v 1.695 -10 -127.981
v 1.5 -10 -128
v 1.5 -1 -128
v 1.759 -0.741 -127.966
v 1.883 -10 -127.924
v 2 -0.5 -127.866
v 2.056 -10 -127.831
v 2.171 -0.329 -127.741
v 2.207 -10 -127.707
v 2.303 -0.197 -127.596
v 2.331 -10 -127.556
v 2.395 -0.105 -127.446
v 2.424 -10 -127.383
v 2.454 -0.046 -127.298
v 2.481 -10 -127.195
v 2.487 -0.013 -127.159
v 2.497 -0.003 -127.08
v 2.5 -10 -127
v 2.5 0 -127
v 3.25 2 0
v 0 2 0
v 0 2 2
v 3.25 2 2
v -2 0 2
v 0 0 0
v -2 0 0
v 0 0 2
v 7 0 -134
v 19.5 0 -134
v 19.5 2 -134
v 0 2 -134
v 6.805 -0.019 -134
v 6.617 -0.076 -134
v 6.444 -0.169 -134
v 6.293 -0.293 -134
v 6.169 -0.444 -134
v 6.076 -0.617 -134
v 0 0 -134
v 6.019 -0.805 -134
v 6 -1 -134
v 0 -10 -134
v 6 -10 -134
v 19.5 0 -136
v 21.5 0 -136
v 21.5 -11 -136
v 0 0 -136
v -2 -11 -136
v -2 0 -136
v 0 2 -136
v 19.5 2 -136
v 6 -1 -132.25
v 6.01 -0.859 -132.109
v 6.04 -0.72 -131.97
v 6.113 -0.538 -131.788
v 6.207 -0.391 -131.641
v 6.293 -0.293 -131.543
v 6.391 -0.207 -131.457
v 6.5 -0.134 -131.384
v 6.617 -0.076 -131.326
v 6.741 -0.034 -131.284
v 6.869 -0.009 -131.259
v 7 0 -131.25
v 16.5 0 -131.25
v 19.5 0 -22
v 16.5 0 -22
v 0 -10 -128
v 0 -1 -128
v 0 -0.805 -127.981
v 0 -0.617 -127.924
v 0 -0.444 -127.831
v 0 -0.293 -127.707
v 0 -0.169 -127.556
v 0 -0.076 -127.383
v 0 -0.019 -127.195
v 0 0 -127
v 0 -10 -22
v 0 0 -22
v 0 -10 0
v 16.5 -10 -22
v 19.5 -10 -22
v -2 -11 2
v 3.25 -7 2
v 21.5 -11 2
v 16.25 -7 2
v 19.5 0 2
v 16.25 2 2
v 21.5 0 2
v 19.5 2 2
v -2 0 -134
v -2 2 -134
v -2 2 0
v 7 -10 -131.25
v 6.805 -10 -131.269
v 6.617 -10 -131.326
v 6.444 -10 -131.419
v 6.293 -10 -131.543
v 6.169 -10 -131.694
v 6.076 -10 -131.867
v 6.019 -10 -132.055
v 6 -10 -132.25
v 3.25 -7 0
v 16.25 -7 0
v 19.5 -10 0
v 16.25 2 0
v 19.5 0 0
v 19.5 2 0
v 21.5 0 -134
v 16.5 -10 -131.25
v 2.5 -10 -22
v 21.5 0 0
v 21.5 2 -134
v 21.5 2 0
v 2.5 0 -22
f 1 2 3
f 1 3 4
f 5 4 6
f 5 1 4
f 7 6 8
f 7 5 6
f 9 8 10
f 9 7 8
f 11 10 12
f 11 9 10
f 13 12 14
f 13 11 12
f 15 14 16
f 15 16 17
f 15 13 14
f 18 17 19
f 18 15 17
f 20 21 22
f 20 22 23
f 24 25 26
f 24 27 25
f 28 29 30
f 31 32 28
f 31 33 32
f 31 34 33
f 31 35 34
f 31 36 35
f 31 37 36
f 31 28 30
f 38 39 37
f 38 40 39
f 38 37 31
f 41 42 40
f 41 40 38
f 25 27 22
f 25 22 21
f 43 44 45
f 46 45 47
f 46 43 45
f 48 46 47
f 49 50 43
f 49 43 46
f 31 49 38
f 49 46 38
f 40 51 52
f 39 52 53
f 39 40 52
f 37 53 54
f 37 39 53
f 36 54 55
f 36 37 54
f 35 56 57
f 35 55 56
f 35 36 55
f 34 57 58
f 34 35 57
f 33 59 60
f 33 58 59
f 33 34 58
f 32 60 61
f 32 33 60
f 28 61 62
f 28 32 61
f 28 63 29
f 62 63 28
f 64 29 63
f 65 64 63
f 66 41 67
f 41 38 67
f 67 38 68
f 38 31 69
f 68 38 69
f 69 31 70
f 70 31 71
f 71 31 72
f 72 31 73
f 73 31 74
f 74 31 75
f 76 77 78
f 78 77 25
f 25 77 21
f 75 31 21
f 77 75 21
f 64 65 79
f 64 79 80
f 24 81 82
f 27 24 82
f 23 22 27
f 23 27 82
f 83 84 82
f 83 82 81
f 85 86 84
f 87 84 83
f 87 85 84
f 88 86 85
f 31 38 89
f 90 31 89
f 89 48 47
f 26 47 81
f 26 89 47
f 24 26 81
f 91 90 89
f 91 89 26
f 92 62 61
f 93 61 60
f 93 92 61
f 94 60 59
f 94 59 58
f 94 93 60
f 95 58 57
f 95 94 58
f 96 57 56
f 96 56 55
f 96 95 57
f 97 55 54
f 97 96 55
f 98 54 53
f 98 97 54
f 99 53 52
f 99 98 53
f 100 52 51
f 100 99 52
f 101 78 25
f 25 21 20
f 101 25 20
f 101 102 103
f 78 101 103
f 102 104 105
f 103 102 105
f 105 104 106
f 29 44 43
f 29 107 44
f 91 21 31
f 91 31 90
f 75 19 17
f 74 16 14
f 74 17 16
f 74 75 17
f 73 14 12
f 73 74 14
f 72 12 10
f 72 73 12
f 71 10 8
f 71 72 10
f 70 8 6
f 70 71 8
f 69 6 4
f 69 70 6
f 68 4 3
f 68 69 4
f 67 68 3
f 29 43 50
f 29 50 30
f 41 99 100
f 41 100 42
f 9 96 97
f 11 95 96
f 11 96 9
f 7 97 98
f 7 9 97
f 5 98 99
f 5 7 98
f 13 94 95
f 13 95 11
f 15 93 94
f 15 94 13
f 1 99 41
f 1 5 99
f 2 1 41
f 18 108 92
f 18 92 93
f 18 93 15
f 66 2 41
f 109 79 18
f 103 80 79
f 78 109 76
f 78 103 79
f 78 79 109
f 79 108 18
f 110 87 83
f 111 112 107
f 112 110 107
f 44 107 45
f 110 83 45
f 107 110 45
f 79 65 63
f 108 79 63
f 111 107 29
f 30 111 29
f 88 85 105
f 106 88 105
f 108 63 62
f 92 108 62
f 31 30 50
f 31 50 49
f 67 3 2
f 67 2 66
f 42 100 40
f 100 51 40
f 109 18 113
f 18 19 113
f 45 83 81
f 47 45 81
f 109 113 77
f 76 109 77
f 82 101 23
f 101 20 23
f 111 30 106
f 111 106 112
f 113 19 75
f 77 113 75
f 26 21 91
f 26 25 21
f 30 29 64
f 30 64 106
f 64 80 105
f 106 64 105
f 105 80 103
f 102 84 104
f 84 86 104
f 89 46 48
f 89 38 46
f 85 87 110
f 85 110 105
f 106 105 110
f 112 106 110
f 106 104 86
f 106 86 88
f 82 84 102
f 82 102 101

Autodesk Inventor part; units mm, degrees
ref_plane "YZ Plane" through (0, 0, 0) normal (1, 0, 0) x (0, 1, 0)
ref_plane "XZ Plane" through (0, 0, 0) normal (0, 1, 0) x (-1, 0, 0)
ref_plane "XY Plane" through (0, 0, 0) normal (0, 0, 1) x (1, 0, 0)
sketch "Sketch1" plane through (0, 0, 0) normal (0, 1, 0) x (-1, 0, 0)
  line L0 (0, 0) -> (-19.5, 0)
  line L1 (-19.5, 0) -> (-19.5, -134)
  line L2 (-19.5, -134) -> (0, -134)
  line L3 (0, -134) -> (0, 0)
  line L4 (2, 2) -> (-21.5, 2)
  line L5 (-21.5, 2) -> (-21.5, -136)
  line L6 (-21.5, -136) -> (2, -136)
  line L7 (2, -136) -> (2, 2)
  line L8 (-2.5, -22) -> (-16.5, -22)
  line L9 (-16.5, -22) -> (-16.5, -131.25)
  line L10 (-16.5, -131.25) -> (-2.5, -131.25)
  line L11 (-2.5, -131.25) -> (-2.5, -22)
  line L12 (-2.5, -22) -> (0, -22)
  line L13 (-2.5, -22) -> (0, -22) construction
  line L14 (-16.5, -22) -> (-19.5, -22)
  line L15 (-16.5, -22) -> (-13.5, -22) construction
  line L16 (-6.724, -131.25) -> (-3.974, -131.25) construction
  line L17 (-6, -131.25) -> (-6, -134)
  line L18 (-2.5, -128) -> (0, -128)
  line L19 (-3.25, 2) -> (-16.25, 2)
  line L20 (-16.25, 2) -> (-16.25, 0)
  line L21 (-16.25, 0) -> (-3.25, 0)
  line L22 (-3.25, 0) -> (-3.25, 2)
  line L23 (-19.5, 0) -> (-21.5, 0)
  line L24 (-21.5, 0) -> (-21.5, 2)
  line L25 (-21.5, 2) -> (-19.5, 2)
  line L26 (-19.5, 2) -> (-19.5, 0)
  line L27 (0, 0) -> (2, 0)
  line L28 (2, 0) -> (2, 2)
  line L29 (2, 2) -> (0, 2)
  line L30 (0, 2) -> (0, 0)
  line L31 (0, -134) -> (2, -134)
  line L32 (2, -134) -> (2, -136)
  line L33 (2, -136) -> (0, -136)
  line L34 (0, -136) -> (0, -134)
  line L35 (-19.5, -134) -> (-21.5, -134)
  line L36 (-21.5, -134) -> (-21.5, -136)
  line L37 (-21.5, -136) -> (-19.5, -136)
  line L38 (-19.5, -136) -> (-19.5, -134)
  dimension "d0" = 19.5
  dimension "d1" = 134
  dimension "d2" = 2
  dimension "d3" = 2
  dimension "d4" = 2
  dimension "d5" = 2
  dimension "d6" = 14
  dimension "d7" = 109.25
  dimension "d8" = 22
  dimension "d9" = 2.5
  dimension "d10" = 0
  dimension "d11" = 180
  dimension "d17" = 6
  dimension "d18" = 6
  dimension "d20" = 13
  dimension "d21" = 5.25
extrude "Extrusion1" add sketch "Sketch1" against normal blind 11
extrude "Extrusion2" cut sketch "Sketch1" against normal blind 10 contours L3 L12 L8 L14 L1 L0 | L3 L2 L17 L10 L11 L18 | L11 L10 L9 L8
fillet "Fillet1" radius 1 4 edges at (2.5, -5, -128) (1.25, 0, -128) (6, 0, -132.625) (6, -5, -131.25)
extrude "Extrusion3" cut sketch "Sketch1" against normal blind 7 contours L0 L20 L4 L22
extrude "Extrusion5" add sketch "Sketch1" along normal blind 2 contours L27 L7 L31 L3 | L34 L6 L38 L2
sketch "Sketch2" plane through (0, 0, 0) normal (0, 1, 0) x (1, 0, 0)
  line L0 (19.5, 0) -> (0, 0) projected
  line L1 (19.5, 0) -> (21.5, 0)
  line L2 (21.5, 0) -> (21.5, 134)
  line L3 (21.5, 134) -> (19.5, 134)
  line L4 (19.5, 134) -> (19.5, 0)
  line L5 (16.25, -2) -> (3.25, -2) projected
  line L6 (19.5, 0) -> (16.25, 0)
  line L7 (16.25, 0) -> (16.25, -2)
  line L8 (16.25, -2) -> (19.5, -2)
  line L9 (19.5, -2) -> (19.5, 0)
  line L10 (-2, -2) -> (3.25, -2) projected
  line L11 (0, 0) -> (3.25, 0)
  line L12 (3.25, 0) -> (3.25, -2)
  line L13 (3.25, -2) -> (0, -2)
  line L14 (0, -2) -> (0, 0)
  dimension "d28" = 2
  dimension "d29" = 134
extrude "Extrusion6" add sketch "Sketch2" along normal blind 2 contours L9 L8 L7 L0 | L4 L3 L2 L1 | L12 L10 L14 L0
properties part number "case-bottom"
